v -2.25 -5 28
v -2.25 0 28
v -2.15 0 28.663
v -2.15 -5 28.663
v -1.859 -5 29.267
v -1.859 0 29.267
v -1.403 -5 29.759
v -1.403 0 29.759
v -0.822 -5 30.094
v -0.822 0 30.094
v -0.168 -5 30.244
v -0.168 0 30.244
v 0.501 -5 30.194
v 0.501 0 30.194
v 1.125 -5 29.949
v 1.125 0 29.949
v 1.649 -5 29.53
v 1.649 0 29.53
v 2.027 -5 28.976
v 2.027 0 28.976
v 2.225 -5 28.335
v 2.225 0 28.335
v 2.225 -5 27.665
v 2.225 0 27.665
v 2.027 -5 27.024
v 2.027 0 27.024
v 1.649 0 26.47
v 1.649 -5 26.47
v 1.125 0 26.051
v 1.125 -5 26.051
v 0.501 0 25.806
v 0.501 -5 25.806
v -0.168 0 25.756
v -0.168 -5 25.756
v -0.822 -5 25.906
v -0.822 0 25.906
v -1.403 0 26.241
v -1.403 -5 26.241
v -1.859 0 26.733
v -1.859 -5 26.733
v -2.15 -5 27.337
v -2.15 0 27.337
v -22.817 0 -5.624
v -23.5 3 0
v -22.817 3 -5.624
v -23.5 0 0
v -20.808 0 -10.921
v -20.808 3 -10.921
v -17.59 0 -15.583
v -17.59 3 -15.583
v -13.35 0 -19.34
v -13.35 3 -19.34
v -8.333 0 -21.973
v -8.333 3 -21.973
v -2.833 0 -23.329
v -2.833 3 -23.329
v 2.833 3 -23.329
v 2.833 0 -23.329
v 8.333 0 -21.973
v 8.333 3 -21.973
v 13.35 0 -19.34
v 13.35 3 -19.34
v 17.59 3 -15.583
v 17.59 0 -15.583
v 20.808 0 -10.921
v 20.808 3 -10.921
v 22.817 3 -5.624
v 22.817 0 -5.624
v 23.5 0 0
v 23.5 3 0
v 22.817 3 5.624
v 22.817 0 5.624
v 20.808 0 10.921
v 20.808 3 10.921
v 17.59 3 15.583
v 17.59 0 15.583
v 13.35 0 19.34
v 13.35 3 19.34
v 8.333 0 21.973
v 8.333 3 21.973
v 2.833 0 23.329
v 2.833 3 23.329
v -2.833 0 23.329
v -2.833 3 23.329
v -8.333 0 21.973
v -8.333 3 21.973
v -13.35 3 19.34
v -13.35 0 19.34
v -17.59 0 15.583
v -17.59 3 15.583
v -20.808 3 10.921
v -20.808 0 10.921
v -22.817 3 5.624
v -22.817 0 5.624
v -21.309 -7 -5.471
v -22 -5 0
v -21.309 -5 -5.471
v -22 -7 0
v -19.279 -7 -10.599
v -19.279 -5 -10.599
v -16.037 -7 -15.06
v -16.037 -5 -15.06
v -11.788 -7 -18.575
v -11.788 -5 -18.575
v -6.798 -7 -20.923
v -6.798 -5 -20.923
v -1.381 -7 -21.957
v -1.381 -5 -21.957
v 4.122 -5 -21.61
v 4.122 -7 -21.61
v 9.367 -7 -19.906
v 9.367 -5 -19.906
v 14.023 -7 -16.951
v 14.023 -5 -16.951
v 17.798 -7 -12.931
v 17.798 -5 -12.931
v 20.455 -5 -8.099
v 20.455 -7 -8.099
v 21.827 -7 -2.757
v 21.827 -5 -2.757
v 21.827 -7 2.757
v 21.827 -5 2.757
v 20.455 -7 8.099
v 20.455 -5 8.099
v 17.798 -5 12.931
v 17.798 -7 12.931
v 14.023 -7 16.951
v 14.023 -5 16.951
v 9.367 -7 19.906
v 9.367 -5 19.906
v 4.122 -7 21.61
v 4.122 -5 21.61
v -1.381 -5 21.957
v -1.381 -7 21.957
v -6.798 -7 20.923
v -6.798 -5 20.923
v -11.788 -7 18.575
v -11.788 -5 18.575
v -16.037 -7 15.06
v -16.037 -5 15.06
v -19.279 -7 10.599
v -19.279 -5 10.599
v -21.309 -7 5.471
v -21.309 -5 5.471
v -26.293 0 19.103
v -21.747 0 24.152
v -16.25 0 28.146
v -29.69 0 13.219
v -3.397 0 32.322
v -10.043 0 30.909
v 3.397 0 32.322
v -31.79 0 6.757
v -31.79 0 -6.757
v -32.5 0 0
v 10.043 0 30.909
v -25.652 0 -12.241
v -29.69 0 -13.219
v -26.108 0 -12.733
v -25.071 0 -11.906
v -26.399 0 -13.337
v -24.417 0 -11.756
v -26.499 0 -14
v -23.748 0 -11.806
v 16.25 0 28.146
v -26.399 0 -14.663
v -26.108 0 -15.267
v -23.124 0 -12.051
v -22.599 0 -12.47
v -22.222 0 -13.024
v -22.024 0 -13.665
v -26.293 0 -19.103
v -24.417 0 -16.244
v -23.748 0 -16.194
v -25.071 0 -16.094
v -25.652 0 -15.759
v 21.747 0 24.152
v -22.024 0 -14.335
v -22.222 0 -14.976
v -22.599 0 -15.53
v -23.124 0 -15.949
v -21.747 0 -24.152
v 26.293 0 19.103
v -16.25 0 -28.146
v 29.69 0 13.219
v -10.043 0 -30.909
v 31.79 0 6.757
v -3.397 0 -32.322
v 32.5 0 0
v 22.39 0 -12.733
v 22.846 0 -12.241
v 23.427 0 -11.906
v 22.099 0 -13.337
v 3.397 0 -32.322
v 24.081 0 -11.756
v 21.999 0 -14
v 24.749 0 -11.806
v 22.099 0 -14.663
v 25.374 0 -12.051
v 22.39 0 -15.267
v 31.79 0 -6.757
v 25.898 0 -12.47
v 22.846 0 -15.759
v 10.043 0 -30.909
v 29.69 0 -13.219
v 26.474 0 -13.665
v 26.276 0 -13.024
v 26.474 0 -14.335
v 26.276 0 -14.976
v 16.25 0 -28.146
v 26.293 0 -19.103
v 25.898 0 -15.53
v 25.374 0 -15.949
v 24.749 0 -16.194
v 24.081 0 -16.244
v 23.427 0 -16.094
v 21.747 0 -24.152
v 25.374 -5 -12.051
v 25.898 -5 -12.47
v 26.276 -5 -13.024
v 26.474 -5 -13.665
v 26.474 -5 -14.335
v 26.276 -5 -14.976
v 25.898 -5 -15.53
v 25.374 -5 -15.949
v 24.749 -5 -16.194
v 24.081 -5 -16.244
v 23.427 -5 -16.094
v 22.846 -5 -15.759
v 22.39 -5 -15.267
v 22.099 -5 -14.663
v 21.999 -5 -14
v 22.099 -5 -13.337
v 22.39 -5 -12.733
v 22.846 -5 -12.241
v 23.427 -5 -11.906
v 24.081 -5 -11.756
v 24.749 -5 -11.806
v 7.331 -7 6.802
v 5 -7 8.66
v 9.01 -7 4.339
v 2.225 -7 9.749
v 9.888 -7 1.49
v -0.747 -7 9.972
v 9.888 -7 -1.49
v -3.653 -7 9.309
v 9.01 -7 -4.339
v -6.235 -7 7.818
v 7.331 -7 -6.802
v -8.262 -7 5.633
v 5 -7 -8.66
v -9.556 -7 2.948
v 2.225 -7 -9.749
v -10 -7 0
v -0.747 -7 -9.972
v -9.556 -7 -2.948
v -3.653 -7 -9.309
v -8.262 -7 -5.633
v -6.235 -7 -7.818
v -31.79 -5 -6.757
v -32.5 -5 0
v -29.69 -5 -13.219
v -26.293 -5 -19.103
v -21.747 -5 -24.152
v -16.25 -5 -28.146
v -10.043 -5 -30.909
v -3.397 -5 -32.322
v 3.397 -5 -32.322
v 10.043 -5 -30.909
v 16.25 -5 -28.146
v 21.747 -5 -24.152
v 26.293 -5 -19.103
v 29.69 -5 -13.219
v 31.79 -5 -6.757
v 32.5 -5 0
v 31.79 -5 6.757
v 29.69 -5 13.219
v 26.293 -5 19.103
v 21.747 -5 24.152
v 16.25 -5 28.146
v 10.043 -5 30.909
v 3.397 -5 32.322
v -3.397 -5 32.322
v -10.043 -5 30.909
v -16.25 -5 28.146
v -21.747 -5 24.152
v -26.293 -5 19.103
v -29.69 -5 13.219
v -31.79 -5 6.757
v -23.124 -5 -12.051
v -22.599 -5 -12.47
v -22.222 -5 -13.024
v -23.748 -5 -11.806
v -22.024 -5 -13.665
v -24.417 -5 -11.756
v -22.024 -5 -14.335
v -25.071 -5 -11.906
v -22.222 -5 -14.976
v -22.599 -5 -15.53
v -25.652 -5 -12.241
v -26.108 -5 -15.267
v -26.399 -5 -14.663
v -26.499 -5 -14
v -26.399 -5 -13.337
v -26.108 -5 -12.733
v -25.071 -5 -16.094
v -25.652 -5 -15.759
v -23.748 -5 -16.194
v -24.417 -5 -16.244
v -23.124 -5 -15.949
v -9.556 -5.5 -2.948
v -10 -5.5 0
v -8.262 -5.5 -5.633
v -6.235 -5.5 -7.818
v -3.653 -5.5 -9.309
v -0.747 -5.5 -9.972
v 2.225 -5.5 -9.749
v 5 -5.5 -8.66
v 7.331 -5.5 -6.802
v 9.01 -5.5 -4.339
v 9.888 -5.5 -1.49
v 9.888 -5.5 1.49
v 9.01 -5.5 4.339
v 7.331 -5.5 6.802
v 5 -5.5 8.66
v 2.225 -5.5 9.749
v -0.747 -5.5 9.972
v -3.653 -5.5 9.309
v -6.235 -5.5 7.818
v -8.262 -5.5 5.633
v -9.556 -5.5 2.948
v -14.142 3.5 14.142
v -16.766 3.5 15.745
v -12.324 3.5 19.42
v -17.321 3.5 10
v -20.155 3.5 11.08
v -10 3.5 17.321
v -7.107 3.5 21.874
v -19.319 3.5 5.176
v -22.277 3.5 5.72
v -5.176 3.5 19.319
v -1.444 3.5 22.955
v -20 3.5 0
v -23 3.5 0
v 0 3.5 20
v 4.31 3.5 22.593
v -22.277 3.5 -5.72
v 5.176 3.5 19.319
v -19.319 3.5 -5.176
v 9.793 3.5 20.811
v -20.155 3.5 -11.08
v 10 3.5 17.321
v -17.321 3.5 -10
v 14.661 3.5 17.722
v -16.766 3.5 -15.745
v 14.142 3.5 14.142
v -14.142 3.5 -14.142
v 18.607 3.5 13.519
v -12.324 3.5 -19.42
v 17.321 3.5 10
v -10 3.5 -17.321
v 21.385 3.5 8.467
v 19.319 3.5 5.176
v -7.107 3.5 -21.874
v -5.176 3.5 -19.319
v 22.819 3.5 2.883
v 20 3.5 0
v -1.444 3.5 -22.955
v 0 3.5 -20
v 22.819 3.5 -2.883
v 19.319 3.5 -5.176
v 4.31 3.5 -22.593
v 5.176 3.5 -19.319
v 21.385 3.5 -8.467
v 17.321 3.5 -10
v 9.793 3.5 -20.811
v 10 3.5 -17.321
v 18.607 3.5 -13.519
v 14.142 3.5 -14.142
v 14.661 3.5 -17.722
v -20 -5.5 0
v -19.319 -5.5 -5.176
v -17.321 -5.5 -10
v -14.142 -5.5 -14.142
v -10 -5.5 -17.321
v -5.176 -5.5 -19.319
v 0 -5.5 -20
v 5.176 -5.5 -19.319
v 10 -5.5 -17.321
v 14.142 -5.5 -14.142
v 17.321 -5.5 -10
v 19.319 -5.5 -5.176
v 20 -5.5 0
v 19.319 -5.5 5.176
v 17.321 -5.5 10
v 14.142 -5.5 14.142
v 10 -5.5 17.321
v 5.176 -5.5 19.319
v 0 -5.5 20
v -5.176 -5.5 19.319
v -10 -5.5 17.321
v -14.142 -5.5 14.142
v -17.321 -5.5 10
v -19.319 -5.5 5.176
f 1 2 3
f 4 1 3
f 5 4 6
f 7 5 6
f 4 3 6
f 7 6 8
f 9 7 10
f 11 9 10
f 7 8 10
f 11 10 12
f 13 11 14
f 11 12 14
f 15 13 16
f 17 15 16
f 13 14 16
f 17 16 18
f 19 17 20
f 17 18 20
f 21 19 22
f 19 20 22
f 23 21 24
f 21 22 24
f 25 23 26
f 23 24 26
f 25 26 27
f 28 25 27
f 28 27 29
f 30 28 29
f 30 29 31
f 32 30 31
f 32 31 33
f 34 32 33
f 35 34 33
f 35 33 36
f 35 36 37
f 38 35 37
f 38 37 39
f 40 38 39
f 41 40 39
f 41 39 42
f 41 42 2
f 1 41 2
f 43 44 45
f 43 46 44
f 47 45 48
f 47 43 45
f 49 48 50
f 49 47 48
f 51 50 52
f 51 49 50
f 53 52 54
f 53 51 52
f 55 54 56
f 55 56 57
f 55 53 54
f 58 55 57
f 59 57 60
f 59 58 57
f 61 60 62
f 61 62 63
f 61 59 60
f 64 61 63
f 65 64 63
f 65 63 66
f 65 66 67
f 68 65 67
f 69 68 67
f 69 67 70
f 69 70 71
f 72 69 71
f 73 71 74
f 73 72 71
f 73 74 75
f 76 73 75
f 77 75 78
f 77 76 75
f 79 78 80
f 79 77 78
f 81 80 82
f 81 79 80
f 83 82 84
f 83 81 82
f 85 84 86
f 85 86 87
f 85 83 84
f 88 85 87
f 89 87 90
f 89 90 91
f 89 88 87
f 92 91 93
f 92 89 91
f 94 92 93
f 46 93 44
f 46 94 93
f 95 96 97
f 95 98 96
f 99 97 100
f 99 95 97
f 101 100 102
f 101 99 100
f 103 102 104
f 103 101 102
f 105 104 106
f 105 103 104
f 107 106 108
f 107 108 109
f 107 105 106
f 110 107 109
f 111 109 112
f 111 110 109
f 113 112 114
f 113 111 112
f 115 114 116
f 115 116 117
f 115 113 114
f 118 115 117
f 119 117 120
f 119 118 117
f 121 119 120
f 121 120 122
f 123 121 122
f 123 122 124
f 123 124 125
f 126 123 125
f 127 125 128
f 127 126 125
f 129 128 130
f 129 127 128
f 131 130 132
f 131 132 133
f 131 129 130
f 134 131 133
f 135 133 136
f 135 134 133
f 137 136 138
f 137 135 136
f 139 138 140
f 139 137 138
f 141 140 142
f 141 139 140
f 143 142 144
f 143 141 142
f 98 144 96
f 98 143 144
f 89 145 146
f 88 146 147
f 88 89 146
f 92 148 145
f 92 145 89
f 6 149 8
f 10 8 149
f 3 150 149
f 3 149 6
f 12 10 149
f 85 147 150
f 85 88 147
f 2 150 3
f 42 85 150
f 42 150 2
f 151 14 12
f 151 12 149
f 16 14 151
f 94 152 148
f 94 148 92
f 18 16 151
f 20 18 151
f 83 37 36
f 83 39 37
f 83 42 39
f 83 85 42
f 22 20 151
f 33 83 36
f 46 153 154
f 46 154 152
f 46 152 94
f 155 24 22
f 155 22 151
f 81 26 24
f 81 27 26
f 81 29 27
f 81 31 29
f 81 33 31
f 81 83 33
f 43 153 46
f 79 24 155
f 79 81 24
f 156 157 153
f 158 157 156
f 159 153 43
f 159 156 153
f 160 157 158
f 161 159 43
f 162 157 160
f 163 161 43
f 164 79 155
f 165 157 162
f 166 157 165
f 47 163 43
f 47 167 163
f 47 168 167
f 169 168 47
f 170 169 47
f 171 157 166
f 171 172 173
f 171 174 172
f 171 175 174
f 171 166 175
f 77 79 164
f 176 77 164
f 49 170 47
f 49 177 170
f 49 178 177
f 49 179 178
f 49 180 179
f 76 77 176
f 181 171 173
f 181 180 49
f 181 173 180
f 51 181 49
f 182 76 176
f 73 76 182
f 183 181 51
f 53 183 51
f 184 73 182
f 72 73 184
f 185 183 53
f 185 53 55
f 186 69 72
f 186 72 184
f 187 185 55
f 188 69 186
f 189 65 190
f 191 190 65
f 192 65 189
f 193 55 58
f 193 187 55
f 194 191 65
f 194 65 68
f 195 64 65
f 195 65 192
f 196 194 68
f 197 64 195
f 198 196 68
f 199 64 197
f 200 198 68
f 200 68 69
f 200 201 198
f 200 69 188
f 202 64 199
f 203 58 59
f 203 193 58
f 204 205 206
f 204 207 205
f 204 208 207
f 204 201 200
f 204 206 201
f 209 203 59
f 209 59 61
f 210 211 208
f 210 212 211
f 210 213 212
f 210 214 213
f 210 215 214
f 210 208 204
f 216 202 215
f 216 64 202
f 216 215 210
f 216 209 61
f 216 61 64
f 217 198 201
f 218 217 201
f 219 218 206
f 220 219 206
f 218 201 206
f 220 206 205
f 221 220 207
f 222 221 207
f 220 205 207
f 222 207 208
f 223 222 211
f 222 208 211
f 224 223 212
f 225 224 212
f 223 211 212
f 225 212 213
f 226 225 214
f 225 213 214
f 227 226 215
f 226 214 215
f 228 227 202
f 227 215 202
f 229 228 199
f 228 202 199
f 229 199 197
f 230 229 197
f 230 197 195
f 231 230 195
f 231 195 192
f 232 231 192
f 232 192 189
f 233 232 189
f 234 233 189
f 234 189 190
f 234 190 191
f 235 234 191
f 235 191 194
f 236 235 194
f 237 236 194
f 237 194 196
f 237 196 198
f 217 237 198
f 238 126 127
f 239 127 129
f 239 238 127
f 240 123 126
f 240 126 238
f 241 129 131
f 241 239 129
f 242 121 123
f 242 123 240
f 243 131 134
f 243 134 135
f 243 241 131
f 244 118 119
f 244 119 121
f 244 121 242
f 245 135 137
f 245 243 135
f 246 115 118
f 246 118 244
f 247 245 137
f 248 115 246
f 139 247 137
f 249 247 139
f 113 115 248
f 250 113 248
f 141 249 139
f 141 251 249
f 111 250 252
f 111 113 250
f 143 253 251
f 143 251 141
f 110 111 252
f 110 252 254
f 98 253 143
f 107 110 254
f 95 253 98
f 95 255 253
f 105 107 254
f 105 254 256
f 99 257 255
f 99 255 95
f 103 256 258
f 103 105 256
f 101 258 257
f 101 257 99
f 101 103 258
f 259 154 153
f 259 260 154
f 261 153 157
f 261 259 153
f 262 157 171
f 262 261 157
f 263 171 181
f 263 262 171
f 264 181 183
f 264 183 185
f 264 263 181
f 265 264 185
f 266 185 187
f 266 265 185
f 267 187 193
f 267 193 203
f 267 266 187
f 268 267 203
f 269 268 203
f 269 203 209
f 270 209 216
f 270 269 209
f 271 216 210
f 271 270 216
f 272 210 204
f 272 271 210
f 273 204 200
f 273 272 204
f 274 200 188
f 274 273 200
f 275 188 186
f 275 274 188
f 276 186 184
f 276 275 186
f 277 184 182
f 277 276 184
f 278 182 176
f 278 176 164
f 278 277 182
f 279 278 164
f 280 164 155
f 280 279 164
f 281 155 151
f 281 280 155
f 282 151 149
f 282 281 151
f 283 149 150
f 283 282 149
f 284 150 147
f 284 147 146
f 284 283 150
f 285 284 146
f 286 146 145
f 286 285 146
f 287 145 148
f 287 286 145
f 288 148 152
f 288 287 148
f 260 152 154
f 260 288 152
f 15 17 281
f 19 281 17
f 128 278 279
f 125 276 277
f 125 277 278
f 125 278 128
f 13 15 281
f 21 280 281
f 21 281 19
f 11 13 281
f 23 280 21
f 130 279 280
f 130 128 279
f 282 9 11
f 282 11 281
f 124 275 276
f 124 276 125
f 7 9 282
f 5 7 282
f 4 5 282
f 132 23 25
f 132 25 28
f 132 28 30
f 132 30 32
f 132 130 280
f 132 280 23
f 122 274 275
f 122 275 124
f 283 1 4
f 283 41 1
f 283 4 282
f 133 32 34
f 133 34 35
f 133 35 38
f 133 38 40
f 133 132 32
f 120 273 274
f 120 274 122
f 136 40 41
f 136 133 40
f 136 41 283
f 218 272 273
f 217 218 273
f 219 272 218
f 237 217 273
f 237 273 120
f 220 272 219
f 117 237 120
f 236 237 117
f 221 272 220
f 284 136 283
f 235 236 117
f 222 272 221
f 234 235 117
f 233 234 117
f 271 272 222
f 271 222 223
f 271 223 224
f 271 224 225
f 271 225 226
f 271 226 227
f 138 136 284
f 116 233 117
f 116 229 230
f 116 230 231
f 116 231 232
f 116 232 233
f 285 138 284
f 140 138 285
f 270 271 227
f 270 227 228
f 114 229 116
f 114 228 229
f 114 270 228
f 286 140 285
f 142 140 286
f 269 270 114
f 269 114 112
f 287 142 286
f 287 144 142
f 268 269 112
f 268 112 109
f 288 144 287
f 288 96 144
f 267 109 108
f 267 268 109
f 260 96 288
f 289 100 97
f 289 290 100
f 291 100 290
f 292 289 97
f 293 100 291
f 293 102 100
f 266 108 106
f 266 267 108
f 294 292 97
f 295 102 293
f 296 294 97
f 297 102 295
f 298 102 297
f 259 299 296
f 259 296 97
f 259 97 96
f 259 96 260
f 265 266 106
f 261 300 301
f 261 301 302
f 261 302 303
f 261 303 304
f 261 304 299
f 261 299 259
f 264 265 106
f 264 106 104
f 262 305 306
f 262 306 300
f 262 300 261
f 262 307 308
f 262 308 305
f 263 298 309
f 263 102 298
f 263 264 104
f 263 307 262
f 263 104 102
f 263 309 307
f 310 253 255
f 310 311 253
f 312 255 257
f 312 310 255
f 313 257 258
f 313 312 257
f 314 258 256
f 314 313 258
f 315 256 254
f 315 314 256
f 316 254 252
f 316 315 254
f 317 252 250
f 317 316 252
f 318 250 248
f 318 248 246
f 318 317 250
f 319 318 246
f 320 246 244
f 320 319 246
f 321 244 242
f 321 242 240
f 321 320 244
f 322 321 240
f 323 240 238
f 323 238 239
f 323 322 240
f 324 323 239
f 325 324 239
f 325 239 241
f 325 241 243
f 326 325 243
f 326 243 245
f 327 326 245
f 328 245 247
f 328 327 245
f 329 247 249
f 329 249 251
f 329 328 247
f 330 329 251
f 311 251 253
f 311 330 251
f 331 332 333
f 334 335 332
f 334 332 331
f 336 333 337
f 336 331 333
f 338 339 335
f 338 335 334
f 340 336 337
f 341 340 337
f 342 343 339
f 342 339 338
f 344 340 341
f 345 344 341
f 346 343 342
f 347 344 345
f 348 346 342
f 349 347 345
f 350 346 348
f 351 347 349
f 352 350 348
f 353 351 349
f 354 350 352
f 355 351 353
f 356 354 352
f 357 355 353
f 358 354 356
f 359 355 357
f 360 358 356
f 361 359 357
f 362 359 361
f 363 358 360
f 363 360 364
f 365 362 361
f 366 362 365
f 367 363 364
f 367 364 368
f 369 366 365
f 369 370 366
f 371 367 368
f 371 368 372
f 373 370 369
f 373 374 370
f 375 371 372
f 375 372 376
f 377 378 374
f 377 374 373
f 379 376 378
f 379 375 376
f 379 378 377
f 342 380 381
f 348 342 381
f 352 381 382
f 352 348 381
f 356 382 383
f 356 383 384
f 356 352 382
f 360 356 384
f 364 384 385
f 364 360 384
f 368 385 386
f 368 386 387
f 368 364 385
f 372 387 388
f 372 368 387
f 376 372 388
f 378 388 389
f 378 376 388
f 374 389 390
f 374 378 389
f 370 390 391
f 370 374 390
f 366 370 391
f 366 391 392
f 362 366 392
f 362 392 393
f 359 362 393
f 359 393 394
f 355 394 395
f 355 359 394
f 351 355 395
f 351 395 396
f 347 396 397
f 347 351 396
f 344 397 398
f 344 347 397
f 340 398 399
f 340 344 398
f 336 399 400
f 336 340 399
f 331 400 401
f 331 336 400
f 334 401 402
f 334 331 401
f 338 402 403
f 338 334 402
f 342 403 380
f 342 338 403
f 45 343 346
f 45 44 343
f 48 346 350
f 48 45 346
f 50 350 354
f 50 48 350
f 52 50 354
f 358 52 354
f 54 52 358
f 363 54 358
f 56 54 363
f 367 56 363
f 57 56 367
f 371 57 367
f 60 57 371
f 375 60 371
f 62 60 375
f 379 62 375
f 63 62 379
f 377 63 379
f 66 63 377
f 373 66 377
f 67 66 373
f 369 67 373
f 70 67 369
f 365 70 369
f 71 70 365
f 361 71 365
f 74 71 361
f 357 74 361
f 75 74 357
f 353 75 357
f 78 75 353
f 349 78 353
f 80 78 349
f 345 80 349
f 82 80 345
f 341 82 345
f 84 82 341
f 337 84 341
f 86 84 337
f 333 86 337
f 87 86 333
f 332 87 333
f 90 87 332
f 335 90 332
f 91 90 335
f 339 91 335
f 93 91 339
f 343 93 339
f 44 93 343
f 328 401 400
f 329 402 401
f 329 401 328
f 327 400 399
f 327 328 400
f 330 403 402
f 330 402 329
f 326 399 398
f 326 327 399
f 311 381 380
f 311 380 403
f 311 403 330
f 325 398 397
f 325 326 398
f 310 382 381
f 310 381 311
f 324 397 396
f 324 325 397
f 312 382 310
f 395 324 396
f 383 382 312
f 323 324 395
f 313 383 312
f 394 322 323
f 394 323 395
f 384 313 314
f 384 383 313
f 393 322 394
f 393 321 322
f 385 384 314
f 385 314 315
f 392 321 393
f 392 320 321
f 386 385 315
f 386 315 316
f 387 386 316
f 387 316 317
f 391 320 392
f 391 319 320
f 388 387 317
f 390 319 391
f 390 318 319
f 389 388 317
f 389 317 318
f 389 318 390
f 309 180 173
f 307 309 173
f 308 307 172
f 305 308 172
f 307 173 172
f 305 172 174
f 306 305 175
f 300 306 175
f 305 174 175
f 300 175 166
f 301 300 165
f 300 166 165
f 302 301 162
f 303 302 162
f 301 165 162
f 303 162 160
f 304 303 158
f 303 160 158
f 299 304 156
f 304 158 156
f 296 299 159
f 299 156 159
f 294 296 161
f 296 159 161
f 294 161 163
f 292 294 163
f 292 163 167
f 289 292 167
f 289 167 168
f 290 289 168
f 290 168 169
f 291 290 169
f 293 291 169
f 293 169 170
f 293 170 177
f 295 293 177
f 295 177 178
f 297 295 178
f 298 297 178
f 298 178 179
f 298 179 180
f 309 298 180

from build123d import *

# Parameters (mm, degrees)
ESQUISSE2_R                  = 2.25
ENL_V_MAT_EXTRU_1_DEPTH      = 47.491934784
R_P_TITION_CIRCULAIRE1_COUNT = 3


with BuildPart() as part:
    # Esquisse1 → Révolution1 (revolve)
    with BuildSketch(Plane.XY):
        Polygon((-10, -7), (-10, -5.5), (-20, -5.5), (-20, 3.5), (-23, 3.5), (-23.5, 3), (-23.5, 0), (-32.5, 0), (-32.5, -5), (-22, -5), (-22, -7), align=None)
    revolve(axis=Axis((0, 39.107095159, 0), (0, -1, 0)))

    # Esquisse2 → Enlèv. mat.-Extru.1 (cut, through all)
    with BuildSketch(Plane(origin=(0, 0, 0), x_dir=(-1, 0, 0), z_dir=(0, 1, 0))):
        with Locations((0, 28)):
            Circle(ESQUISSE2_R)
    enl_v_mat_extru_1 = extrude(amount=-ENL_V_MAT_EXTRU_1_DEPTH, mode=Mode.SUBTRACT)

    # Répétition circulaire1: Enlèv. mat.-Extru.1 ×3 about axis
    r_p_tition_circulaire1_axis = Axis((0, 0, 0), (0, 1, 0))
    for i in range(1, R_P_TITION_CIRCULAIRE1_COUNT):
        add(enl_v_mat_extru_1.rotate(r_p_tition_circulaire1_axis, i * 360 / R_P_TITION_CIRCULAIRE1_COUNT), mode=Mode.SUBTRACT)


solid = part.part
